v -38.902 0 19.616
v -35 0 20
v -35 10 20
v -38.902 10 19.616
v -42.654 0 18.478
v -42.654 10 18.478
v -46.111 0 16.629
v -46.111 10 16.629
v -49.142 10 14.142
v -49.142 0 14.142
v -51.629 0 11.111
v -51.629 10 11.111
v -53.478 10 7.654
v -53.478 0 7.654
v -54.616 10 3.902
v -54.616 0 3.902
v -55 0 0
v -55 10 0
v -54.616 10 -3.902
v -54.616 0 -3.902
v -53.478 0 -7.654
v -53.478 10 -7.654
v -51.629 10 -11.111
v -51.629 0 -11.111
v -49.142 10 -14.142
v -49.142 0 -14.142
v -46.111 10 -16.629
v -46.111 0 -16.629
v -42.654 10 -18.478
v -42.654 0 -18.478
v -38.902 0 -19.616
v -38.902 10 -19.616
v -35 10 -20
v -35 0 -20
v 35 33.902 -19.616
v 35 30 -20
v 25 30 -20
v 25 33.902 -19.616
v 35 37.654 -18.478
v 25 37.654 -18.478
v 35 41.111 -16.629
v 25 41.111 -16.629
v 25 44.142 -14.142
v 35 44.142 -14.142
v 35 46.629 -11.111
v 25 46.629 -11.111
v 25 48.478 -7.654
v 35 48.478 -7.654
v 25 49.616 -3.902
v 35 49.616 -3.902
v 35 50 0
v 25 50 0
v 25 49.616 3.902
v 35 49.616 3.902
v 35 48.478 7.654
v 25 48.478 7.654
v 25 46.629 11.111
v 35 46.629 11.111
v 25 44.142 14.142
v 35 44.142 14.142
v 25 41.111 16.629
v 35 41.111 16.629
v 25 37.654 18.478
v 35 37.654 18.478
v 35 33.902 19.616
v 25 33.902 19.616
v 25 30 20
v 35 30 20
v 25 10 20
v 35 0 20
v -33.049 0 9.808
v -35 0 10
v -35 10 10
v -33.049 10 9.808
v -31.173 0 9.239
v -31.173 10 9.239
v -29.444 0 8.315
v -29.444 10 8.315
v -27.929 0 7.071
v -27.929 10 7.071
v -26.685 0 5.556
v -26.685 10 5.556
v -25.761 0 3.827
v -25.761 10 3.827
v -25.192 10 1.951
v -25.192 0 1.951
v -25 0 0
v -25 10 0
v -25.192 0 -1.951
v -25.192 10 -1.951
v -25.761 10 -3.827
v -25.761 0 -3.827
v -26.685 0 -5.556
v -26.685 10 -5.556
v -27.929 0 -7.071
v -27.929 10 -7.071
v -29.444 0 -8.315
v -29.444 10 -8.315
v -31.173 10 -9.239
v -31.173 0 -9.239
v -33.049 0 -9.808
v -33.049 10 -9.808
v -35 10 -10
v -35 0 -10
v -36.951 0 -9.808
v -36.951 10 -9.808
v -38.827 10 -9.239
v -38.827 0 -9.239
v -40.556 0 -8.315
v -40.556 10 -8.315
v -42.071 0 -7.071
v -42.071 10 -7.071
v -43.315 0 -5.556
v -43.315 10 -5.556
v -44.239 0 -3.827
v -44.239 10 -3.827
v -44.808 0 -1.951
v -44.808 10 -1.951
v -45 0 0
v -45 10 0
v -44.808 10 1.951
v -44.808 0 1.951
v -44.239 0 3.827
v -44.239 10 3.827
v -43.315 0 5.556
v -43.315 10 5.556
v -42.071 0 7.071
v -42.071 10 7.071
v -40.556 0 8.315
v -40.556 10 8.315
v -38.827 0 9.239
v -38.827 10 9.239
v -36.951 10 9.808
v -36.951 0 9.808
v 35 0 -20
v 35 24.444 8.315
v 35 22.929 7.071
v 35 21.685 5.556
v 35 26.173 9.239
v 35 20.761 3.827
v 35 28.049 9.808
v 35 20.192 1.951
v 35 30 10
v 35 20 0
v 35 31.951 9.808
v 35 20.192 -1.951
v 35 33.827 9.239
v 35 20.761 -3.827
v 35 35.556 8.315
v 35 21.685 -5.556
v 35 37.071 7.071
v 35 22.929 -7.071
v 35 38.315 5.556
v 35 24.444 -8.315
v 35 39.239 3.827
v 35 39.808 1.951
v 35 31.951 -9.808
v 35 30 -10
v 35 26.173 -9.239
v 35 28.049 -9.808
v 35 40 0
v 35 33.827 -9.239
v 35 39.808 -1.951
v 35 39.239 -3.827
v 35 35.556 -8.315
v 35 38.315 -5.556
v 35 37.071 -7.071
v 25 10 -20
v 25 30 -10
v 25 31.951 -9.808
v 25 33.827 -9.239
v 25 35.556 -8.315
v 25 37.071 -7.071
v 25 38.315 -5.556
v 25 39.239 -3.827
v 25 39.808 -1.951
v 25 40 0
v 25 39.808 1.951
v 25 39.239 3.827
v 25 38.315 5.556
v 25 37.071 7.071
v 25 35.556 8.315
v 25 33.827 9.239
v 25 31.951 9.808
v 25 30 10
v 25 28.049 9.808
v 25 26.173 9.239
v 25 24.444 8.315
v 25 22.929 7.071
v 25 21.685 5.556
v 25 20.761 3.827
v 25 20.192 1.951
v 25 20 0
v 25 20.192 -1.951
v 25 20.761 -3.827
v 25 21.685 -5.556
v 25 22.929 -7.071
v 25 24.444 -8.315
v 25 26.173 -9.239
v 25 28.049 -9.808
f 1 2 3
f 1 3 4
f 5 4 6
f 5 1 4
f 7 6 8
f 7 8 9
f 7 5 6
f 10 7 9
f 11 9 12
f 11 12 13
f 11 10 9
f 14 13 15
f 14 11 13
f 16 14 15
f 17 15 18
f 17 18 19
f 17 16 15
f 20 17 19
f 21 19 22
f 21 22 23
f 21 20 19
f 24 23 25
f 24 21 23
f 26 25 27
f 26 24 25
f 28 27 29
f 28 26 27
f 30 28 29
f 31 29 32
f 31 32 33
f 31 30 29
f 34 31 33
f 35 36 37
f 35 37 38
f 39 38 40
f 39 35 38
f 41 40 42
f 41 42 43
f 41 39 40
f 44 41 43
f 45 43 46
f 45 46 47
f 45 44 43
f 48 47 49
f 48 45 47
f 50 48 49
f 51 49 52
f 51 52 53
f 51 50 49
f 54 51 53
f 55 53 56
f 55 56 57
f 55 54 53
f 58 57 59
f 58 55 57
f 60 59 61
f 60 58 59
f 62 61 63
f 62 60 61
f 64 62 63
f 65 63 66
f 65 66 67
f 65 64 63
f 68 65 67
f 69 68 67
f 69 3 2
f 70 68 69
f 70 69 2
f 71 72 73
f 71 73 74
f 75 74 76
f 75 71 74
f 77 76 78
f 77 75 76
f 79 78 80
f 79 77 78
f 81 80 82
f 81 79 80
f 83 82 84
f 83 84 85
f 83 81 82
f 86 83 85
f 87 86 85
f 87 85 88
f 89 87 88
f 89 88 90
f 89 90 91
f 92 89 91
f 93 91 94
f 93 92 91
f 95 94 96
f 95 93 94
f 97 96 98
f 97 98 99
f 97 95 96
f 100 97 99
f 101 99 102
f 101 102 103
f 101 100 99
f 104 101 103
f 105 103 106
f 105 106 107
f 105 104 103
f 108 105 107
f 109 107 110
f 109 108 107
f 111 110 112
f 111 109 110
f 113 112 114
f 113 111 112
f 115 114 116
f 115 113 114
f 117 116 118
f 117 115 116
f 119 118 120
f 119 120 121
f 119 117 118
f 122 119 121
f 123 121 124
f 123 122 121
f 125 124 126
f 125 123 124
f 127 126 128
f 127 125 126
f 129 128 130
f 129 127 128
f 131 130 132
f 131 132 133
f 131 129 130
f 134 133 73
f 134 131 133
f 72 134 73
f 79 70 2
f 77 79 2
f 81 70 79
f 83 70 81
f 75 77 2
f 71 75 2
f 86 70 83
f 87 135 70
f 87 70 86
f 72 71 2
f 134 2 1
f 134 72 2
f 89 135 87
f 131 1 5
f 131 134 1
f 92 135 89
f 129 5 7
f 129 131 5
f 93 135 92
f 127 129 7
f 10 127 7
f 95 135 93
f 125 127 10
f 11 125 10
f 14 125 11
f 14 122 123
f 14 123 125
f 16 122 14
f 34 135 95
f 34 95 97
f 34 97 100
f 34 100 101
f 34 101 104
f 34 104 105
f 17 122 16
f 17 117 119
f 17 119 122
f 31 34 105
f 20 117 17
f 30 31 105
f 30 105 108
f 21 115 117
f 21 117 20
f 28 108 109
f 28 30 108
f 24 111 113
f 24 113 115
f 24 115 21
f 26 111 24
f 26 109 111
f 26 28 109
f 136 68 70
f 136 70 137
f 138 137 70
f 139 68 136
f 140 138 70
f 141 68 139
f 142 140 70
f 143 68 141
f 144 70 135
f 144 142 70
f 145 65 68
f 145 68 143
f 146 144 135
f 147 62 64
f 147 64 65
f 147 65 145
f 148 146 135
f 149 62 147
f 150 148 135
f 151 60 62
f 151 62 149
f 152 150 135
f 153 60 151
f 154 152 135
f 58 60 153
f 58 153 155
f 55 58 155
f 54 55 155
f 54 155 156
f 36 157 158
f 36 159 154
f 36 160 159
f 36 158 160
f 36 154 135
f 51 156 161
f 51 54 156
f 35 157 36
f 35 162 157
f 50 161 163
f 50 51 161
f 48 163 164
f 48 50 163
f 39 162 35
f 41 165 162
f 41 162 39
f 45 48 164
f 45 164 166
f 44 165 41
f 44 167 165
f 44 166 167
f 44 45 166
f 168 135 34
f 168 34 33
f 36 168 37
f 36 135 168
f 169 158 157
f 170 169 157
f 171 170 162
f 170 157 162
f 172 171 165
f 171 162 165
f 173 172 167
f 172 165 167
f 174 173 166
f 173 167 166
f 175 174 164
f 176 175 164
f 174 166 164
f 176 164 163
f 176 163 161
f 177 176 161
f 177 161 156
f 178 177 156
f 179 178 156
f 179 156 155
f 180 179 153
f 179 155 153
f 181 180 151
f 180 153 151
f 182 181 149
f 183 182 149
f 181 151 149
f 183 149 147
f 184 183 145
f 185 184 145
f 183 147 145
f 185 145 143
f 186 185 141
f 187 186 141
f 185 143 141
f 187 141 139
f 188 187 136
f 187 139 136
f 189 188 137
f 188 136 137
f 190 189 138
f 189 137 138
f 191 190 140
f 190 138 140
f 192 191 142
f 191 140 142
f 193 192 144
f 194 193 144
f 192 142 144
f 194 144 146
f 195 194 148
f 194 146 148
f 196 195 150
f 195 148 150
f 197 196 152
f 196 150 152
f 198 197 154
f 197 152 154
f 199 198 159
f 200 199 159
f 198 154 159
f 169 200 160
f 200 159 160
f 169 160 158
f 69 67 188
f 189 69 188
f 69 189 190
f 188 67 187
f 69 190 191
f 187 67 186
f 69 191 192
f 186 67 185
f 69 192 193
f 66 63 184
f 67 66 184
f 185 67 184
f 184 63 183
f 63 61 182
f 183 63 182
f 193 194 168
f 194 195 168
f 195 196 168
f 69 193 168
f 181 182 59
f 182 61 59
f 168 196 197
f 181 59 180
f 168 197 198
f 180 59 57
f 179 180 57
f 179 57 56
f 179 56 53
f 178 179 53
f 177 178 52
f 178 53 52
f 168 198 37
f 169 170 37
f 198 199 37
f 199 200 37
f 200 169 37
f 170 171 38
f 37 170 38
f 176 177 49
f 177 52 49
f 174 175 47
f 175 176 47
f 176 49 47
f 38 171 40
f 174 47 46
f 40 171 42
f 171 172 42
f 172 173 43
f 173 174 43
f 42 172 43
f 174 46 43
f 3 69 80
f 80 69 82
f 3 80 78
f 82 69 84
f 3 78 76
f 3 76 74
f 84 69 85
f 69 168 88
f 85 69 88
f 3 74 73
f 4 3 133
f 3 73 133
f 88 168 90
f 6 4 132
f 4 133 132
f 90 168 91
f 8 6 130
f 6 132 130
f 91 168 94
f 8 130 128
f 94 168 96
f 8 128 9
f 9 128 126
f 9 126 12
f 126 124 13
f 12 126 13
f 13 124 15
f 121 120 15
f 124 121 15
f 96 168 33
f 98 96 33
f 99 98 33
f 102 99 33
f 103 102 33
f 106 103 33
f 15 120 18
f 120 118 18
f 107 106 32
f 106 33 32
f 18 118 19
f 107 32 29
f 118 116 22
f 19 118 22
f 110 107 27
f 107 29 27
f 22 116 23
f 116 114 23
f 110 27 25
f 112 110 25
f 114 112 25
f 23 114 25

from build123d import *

# Parameters (mm, degrees)
SKETCH1_R           = 10
BOSS_EXTRUDE1_DEPTH = 10
SKETCH3_R           = 10
BOSS_EXTRUDE2_DEPTH = 10


with BuildPart() as part:
    # Sketch1 → Boss-Extrude1 (new body)
    with BuildSketch(Plane(origin=(0, 0, 0), x_dir=(1, 0, 0), z_dir=(0, 1, 0))):
        with BuildLine():
            Line((-35, 20), (35, 20))
            Line((35, 20), (35, -20))
            Line((35, -20), (-35, -20))
            ThreePointArc((-35, -20), (-55, 0), (-35, 20))
        make_face()
        with Locations(Location((-35, 0, 0), (0, 0, 270))):
            Circle(SKETCH1_R, mode=Mode.SUBTRACT)
    extrude(amount=BOSS_EXTRUDE1_DEPTH)

    # Sketch3 → Boss-Extrude2 (add)
    with BuildSketch(Plane(origin=(35, 0, 0), x_dir=(0, 0, -1), z_dir=(1, 0, 0))):
        with BuildLine():
            Line((-20, 10), (20, 10))
            Line((20, 10), (20, 30))
            ThreePointArc((20, 30), (0, 50), (-20, 30))
            Line((-20, 30), (-20, 10))
        make_face()
        with Locations((0, 30)):
            Circle(SKETCH3_R, mode=Mode.SUBTRACT)
    extrude(amount=-BOSS_EXTRUDE2_DEPTH)


solid = part.part
